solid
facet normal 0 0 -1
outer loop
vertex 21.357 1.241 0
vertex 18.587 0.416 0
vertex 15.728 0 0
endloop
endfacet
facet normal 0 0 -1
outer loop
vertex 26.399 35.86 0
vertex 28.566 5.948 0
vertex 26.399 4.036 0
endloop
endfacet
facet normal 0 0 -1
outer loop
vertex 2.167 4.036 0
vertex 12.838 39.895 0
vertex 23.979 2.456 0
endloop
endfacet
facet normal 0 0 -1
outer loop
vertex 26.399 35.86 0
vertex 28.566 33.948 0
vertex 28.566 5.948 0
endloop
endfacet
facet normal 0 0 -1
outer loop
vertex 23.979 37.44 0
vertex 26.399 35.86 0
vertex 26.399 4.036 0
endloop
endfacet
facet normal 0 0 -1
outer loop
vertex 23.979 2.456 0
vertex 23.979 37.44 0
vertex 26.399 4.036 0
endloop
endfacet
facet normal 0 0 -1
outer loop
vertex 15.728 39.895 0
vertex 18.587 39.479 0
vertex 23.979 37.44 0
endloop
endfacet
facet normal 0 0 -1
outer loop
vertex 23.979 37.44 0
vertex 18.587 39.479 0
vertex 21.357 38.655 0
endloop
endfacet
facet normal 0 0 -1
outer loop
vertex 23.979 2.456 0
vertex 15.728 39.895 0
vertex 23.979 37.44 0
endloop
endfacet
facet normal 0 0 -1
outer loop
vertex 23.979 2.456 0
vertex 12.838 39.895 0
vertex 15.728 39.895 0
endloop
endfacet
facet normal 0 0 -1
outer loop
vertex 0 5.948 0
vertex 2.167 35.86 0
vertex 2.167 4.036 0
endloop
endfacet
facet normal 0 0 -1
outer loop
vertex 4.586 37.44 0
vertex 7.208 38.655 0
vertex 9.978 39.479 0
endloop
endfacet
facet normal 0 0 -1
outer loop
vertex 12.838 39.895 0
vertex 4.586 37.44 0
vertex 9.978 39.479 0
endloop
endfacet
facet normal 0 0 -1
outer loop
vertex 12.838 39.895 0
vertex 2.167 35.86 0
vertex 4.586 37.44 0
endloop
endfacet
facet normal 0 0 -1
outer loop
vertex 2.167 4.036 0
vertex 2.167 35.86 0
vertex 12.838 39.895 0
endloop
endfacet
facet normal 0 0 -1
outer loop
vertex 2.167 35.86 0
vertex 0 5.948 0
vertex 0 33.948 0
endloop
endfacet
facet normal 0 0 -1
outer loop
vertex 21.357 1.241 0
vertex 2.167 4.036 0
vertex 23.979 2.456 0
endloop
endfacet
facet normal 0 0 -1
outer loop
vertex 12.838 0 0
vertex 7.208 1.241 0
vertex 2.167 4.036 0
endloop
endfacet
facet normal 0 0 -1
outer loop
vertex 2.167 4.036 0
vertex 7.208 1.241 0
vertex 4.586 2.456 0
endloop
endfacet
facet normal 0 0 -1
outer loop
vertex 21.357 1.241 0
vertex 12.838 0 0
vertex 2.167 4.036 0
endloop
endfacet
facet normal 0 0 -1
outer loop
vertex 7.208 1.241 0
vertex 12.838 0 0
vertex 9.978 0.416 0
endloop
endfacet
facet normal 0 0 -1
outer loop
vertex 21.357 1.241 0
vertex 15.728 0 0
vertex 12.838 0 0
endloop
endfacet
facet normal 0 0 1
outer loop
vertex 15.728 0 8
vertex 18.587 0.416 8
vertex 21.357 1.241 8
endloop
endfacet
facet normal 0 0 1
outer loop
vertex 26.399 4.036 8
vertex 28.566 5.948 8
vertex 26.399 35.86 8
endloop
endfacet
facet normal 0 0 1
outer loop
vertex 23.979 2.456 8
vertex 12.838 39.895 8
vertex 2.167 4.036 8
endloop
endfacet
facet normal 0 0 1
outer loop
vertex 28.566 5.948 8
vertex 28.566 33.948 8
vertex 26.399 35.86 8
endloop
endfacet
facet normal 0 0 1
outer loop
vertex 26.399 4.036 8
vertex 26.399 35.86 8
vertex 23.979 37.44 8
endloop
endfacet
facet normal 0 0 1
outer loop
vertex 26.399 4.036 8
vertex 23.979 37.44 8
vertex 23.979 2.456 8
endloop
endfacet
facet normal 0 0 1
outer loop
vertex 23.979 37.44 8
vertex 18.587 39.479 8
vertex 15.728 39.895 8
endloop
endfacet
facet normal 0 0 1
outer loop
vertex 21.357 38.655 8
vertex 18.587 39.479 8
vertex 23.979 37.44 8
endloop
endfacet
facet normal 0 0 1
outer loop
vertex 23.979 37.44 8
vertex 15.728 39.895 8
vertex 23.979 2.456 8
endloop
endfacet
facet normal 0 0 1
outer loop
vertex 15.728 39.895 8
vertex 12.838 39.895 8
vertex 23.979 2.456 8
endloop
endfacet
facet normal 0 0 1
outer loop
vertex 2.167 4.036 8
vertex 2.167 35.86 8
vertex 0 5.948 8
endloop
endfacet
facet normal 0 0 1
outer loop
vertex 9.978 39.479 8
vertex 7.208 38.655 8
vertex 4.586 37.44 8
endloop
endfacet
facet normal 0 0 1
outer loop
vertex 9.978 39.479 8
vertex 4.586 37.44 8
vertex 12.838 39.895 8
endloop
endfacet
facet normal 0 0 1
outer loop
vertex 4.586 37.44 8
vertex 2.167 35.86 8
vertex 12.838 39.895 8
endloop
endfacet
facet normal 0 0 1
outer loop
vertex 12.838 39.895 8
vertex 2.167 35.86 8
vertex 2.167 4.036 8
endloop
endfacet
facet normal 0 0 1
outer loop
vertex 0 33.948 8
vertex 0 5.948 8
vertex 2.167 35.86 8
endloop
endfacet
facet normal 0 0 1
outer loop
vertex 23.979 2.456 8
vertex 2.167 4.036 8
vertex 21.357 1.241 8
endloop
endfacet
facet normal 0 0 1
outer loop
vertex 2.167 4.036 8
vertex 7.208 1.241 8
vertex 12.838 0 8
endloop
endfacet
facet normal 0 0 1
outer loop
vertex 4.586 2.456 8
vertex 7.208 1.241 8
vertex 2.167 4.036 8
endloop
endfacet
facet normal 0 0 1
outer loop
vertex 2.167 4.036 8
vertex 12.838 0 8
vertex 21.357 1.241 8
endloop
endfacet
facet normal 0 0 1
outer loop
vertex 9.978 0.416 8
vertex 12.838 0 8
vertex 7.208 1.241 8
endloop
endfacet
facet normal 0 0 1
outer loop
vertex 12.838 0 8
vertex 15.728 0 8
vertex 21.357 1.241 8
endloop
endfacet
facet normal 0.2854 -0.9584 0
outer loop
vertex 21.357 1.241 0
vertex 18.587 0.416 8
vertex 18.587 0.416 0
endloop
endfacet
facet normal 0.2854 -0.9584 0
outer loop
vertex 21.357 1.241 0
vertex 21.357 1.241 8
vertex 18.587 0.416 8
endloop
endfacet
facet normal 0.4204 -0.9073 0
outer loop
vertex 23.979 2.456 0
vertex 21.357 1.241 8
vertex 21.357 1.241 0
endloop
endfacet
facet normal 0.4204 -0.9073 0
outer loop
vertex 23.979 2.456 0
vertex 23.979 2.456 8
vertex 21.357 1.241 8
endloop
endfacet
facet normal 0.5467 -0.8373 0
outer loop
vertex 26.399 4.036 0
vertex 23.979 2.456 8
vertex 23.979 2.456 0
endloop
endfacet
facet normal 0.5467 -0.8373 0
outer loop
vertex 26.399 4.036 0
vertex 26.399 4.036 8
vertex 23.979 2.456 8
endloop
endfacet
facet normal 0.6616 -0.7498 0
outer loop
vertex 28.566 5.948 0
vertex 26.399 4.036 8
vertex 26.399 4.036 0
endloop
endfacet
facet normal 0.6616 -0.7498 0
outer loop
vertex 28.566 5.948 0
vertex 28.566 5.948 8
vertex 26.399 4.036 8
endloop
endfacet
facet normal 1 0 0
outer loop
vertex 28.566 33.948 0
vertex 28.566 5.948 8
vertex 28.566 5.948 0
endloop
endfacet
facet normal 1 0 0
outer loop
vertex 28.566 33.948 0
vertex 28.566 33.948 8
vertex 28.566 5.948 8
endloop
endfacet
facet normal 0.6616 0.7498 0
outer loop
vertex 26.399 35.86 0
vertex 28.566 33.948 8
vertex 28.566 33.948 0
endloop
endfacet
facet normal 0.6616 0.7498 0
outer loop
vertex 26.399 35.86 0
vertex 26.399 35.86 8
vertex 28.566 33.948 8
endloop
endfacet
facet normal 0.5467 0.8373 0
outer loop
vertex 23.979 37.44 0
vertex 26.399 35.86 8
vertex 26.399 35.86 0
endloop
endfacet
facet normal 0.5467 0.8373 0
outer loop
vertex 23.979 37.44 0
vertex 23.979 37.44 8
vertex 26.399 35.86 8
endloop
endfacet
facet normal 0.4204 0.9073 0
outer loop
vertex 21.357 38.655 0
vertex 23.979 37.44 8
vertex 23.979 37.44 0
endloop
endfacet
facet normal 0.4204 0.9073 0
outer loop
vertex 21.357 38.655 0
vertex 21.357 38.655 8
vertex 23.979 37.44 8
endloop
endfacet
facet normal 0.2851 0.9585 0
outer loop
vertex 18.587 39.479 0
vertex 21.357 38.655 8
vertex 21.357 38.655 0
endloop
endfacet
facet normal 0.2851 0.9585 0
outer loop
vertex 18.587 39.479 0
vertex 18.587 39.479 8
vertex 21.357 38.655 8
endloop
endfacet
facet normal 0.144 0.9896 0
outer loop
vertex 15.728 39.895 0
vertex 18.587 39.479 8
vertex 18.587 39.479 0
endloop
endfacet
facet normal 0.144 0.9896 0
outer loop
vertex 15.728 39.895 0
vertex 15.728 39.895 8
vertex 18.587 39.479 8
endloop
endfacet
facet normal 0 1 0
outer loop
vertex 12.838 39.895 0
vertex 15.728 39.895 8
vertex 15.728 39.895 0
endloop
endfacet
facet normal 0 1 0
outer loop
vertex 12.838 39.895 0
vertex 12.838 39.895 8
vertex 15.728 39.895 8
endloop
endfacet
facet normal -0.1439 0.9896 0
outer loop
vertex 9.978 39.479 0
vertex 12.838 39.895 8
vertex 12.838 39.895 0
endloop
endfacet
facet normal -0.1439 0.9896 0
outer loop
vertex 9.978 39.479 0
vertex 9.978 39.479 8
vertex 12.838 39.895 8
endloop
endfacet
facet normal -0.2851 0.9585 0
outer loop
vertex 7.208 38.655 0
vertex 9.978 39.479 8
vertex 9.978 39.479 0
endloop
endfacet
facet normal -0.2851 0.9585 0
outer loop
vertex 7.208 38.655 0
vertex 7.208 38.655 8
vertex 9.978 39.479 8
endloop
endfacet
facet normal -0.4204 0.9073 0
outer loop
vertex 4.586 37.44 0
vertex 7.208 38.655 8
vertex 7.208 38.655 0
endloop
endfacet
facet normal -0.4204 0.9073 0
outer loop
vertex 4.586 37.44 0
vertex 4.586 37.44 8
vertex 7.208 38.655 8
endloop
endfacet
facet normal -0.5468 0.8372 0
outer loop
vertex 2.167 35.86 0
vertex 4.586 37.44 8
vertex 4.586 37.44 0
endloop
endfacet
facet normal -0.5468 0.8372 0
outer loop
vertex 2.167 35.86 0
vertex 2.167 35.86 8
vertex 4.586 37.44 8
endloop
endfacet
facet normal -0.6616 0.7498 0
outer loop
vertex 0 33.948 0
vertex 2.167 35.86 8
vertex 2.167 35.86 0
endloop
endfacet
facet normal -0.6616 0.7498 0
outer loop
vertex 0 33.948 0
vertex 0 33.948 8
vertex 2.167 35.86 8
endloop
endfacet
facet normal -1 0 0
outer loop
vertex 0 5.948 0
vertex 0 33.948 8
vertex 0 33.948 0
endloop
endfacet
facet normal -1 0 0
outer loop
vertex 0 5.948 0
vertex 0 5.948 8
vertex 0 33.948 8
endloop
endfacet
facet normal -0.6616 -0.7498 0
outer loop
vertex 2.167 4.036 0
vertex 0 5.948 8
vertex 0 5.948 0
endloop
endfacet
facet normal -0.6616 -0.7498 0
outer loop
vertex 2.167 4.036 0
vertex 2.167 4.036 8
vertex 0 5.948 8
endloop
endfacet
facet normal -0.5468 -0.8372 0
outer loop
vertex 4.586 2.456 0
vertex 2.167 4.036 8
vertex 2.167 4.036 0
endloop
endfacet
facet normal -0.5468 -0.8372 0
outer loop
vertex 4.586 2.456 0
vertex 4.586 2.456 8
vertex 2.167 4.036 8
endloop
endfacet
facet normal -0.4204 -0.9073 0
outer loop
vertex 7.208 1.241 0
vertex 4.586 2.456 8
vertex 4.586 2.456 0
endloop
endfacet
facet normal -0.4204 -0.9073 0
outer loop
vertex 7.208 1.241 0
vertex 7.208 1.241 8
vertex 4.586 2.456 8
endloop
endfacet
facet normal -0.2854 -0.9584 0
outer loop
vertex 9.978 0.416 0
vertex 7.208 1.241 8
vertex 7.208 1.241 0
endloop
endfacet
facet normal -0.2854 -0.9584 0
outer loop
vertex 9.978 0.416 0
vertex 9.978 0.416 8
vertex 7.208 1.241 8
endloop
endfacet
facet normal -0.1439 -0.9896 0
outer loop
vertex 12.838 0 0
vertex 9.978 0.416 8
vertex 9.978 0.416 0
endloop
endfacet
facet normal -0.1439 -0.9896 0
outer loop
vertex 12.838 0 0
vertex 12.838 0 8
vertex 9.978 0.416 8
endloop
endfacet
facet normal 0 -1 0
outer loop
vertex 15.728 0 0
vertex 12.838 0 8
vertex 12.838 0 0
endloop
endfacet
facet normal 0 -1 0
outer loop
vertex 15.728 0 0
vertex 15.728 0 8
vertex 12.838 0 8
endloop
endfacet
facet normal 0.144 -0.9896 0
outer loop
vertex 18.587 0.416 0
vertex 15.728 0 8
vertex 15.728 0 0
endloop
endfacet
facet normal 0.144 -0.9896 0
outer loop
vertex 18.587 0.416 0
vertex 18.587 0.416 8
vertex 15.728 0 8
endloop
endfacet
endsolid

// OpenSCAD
$fn = 32;

// ----------------------------------------------------------------------
// Eccentric disc: double_d, 8 mm thick
// ----------------------------------------------------------------------

// --- parameters (mm) ---
profile_height = 8;       // extrusion height
profile_points = 24;      // points of the closed outline

profile = [[28.566, 33.948], [26.399, 35.86], [23.979, 37.44], [21.357, 38.655], [18.587, 39.479], [15.728, 39.895], [12.838, 39.895], [9.978, 39.479], [7.208, 38.655], [4.586, 37.44], [2.167, 35.86], [0, 33.948], [0, 5.948], [2.167, 4.036], [4.586, 2.456], [7.208, 1.241], [9.978, 0.416], [12.838, 0], [15.728, 0], [18.587, 0.416], [21.357, 1.241], [23.979, 2.456], [26.399, 4.036], [28.566, 5.948]];  // single closed polygon, 24 points, counter clockwise

// --- the one profile operation ---
linear_extrude(height = profile_height) polygon(points = profile);
